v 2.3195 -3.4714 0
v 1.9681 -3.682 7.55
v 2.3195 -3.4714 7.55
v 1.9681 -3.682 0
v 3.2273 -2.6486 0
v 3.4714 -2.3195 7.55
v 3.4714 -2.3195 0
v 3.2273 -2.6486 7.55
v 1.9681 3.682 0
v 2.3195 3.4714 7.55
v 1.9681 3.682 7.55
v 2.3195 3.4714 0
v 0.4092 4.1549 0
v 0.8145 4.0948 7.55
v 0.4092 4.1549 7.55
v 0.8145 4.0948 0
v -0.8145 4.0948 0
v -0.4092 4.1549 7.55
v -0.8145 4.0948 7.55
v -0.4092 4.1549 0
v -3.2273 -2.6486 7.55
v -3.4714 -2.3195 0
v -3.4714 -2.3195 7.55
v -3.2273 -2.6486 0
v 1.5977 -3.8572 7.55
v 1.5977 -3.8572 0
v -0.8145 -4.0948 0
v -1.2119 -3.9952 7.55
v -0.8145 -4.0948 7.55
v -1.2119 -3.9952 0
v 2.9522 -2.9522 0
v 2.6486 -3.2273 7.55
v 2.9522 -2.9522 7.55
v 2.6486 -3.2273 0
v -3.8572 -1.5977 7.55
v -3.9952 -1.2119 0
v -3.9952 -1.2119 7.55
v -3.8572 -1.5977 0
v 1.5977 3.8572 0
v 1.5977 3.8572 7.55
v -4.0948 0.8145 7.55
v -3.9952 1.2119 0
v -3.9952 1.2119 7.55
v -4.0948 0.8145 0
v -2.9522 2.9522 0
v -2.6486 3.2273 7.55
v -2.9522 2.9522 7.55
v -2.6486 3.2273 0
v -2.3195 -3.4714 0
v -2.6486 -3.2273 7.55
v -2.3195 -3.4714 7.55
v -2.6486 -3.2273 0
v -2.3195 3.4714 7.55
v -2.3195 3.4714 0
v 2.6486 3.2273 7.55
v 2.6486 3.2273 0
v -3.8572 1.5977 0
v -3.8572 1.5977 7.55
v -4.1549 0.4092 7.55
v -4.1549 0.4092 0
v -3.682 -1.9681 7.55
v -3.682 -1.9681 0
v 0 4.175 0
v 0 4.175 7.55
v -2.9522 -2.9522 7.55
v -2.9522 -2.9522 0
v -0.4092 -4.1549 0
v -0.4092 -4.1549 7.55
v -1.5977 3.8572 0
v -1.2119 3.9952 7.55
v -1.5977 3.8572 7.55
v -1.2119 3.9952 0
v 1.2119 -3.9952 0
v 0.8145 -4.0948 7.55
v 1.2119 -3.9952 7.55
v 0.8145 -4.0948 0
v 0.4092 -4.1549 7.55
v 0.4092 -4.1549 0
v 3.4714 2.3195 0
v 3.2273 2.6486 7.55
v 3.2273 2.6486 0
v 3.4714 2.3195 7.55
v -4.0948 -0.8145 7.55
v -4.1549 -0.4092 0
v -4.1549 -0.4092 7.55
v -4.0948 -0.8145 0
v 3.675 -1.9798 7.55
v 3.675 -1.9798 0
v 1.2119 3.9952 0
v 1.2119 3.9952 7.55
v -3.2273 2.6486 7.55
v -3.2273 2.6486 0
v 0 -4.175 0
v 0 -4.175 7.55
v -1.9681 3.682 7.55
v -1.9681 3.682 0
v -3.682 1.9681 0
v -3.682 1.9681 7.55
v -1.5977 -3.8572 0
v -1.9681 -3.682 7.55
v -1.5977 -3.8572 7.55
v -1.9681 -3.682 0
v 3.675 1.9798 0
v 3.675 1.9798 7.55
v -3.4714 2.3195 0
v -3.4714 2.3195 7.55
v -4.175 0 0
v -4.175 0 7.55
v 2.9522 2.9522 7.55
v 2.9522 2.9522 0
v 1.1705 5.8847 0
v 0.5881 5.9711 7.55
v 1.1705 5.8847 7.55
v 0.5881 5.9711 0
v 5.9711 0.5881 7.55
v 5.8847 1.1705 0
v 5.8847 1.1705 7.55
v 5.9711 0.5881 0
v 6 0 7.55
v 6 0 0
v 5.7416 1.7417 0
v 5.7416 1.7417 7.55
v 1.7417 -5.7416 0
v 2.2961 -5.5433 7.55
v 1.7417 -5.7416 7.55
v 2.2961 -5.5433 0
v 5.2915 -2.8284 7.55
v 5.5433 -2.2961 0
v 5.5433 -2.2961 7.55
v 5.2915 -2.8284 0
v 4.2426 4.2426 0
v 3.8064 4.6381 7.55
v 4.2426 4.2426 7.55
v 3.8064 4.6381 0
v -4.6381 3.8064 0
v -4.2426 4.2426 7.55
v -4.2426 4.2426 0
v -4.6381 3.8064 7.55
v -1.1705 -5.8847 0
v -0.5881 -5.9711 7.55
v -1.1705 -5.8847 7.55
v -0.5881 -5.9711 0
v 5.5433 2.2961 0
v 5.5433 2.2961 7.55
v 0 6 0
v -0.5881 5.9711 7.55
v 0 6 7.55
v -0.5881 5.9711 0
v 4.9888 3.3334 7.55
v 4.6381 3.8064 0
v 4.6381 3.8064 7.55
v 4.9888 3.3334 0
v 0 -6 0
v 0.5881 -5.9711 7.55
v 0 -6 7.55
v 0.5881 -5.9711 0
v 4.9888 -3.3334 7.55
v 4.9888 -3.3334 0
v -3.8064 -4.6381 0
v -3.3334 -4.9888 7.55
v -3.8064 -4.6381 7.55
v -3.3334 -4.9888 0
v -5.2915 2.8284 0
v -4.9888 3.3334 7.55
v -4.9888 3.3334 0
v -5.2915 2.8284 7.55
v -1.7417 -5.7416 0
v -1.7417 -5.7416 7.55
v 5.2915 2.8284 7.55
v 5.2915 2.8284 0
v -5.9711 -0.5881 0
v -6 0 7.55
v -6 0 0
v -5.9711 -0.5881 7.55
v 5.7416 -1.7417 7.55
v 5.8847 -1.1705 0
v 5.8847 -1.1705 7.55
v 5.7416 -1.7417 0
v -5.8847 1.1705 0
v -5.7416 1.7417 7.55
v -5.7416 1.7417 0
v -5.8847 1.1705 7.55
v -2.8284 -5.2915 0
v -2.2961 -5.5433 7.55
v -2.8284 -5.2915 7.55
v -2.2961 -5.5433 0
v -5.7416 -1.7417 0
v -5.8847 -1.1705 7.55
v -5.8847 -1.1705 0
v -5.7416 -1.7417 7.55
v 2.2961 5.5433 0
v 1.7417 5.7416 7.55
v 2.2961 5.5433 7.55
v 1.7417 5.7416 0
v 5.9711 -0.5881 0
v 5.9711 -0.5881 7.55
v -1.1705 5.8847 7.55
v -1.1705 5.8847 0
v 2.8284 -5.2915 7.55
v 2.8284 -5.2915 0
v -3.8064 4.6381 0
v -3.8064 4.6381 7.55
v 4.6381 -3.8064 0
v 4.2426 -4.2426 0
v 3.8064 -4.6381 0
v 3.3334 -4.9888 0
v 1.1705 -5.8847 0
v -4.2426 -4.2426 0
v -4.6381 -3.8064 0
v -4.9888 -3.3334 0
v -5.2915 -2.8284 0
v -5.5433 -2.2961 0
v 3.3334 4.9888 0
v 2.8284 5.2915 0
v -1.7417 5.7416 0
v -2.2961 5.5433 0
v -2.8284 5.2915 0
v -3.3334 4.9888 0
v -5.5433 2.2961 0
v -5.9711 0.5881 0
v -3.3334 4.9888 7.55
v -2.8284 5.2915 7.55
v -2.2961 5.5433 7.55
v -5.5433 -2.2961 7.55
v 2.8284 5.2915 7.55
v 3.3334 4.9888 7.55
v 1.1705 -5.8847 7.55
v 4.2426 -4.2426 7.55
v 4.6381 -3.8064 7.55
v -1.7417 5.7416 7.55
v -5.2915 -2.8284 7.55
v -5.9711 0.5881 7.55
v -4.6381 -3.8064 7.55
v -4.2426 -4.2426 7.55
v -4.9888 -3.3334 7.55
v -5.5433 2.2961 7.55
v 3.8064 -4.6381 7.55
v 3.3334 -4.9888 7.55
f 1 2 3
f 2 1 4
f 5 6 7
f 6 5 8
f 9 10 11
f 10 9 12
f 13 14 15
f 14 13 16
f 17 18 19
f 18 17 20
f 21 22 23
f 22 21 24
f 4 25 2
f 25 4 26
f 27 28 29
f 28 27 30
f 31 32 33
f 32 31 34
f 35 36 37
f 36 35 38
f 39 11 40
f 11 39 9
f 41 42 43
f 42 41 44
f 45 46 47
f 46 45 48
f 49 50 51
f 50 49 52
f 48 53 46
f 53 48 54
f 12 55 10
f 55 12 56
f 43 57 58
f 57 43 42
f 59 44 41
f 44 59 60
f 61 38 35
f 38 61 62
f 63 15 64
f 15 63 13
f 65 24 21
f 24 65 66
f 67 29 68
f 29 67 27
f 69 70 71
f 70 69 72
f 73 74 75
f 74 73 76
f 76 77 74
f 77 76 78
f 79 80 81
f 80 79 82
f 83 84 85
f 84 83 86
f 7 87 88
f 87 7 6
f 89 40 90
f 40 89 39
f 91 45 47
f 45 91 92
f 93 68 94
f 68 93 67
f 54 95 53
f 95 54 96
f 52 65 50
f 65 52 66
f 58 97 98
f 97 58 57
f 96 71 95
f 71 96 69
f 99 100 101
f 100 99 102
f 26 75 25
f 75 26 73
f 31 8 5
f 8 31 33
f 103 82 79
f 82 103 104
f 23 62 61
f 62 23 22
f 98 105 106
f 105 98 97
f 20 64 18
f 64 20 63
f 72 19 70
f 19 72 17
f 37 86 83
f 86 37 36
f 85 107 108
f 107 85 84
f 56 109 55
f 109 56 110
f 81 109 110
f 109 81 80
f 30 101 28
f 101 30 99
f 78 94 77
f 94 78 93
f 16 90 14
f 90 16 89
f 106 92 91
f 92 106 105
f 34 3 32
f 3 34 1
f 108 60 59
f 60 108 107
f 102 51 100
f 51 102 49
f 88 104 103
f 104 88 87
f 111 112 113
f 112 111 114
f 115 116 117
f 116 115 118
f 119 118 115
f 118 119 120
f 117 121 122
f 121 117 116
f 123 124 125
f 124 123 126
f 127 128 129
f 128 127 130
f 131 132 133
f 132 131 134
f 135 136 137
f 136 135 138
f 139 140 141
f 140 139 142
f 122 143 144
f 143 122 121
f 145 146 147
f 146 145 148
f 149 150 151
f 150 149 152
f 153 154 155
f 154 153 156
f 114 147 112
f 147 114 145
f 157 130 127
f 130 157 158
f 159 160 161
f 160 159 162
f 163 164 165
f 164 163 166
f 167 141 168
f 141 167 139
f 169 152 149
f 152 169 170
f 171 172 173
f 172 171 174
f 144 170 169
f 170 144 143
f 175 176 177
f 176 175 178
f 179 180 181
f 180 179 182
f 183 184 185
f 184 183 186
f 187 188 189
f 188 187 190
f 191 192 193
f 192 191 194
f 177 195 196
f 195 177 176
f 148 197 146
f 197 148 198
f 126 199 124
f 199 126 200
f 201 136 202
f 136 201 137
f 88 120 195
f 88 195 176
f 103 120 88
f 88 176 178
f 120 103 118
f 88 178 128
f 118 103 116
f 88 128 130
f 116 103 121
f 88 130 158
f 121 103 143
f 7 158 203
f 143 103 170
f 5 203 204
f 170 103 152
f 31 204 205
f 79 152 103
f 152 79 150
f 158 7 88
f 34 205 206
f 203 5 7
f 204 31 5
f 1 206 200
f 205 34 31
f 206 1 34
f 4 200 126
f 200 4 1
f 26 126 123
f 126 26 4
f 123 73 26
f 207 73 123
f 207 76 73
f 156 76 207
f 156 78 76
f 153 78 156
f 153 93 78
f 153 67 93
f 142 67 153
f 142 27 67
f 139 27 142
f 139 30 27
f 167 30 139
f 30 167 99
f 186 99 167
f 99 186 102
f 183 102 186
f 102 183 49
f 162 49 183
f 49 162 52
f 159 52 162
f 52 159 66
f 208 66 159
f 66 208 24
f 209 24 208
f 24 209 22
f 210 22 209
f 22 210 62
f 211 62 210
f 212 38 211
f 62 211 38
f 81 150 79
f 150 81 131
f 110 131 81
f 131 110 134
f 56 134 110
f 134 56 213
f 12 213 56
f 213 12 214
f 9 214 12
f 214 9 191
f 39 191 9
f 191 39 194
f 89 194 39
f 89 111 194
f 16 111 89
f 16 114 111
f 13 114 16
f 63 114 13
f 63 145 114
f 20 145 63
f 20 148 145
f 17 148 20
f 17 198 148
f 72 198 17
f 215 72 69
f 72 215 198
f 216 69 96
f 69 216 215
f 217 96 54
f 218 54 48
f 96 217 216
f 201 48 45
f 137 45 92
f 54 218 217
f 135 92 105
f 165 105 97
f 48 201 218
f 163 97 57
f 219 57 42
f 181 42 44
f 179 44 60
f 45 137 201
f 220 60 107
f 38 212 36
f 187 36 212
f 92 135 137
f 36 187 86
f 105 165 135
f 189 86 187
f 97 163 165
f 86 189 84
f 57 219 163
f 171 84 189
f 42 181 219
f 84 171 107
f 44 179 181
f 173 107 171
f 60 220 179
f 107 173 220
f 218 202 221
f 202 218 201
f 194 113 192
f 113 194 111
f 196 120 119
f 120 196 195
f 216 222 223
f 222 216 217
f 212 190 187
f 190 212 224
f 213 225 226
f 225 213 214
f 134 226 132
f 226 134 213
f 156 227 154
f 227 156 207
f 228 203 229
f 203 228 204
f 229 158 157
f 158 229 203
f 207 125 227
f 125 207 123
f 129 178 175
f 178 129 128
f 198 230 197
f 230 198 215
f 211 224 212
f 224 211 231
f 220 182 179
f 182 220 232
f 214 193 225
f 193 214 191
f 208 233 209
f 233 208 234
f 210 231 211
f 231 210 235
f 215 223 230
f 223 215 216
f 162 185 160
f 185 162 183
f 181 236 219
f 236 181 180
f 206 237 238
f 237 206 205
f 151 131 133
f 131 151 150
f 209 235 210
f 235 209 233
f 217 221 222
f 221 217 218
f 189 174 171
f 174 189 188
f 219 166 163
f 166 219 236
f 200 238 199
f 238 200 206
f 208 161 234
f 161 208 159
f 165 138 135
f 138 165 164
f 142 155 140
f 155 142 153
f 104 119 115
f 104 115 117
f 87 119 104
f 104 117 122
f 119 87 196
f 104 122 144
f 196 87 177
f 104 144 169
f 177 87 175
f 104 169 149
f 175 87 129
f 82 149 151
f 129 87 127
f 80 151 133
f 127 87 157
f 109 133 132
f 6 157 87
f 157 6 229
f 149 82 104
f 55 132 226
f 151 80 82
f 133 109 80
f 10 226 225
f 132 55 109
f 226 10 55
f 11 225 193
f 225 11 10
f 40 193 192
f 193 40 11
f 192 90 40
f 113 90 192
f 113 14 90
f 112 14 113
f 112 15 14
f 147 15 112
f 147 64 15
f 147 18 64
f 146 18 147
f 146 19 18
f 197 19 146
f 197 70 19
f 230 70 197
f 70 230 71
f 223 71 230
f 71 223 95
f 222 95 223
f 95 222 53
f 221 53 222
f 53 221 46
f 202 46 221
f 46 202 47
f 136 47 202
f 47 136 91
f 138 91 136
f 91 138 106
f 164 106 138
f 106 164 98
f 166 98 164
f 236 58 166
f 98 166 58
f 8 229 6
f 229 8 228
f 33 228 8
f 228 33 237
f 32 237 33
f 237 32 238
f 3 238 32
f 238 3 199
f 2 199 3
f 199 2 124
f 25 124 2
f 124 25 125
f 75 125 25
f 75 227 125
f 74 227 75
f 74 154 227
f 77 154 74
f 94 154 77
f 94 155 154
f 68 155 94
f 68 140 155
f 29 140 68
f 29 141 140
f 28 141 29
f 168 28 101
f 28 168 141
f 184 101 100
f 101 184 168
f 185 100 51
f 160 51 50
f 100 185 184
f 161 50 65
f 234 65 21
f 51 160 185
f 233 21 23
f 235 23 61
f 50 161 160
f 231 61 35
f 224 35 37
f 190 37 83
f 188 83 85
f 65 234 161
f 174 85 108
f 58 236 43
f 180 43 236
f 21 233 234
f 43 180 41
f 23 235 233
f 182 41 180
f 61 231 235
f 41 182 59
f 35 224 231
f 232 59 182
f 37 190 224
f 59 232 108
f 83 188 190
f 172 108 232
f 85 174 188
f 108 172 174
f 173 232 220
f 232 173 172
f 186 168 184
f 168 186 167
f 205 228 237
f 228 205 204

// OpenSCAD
// Gen-DH — gap sleeve: rigid spacer on the shaft BETWEEN the two rotor carriers (passes through the stator
// hole). Length = m2m, so it sets the magnet gap and carries the full magnet pull. Print x1, upright.
include <parameters.scad>;
$fn = 64;
// D-flat keyed bore: flat faces +X (angle 0 = magnet pocket 0 = index notch)
module dflat_bore(h) {
    intersection() {
        cylinder(d=shaft_bore, h=h);
        translate([-shaft_bore, -shaft_bore, 0]) cube([shaft_bore + dflat_x, 2*shaft_bore, h]);
    }
}

difference() {
    cylinder(d=sleeve_od, h=m2m);
    translate([0, 0, -0.1]) dflat_bore(m2m + 0.2);
}
